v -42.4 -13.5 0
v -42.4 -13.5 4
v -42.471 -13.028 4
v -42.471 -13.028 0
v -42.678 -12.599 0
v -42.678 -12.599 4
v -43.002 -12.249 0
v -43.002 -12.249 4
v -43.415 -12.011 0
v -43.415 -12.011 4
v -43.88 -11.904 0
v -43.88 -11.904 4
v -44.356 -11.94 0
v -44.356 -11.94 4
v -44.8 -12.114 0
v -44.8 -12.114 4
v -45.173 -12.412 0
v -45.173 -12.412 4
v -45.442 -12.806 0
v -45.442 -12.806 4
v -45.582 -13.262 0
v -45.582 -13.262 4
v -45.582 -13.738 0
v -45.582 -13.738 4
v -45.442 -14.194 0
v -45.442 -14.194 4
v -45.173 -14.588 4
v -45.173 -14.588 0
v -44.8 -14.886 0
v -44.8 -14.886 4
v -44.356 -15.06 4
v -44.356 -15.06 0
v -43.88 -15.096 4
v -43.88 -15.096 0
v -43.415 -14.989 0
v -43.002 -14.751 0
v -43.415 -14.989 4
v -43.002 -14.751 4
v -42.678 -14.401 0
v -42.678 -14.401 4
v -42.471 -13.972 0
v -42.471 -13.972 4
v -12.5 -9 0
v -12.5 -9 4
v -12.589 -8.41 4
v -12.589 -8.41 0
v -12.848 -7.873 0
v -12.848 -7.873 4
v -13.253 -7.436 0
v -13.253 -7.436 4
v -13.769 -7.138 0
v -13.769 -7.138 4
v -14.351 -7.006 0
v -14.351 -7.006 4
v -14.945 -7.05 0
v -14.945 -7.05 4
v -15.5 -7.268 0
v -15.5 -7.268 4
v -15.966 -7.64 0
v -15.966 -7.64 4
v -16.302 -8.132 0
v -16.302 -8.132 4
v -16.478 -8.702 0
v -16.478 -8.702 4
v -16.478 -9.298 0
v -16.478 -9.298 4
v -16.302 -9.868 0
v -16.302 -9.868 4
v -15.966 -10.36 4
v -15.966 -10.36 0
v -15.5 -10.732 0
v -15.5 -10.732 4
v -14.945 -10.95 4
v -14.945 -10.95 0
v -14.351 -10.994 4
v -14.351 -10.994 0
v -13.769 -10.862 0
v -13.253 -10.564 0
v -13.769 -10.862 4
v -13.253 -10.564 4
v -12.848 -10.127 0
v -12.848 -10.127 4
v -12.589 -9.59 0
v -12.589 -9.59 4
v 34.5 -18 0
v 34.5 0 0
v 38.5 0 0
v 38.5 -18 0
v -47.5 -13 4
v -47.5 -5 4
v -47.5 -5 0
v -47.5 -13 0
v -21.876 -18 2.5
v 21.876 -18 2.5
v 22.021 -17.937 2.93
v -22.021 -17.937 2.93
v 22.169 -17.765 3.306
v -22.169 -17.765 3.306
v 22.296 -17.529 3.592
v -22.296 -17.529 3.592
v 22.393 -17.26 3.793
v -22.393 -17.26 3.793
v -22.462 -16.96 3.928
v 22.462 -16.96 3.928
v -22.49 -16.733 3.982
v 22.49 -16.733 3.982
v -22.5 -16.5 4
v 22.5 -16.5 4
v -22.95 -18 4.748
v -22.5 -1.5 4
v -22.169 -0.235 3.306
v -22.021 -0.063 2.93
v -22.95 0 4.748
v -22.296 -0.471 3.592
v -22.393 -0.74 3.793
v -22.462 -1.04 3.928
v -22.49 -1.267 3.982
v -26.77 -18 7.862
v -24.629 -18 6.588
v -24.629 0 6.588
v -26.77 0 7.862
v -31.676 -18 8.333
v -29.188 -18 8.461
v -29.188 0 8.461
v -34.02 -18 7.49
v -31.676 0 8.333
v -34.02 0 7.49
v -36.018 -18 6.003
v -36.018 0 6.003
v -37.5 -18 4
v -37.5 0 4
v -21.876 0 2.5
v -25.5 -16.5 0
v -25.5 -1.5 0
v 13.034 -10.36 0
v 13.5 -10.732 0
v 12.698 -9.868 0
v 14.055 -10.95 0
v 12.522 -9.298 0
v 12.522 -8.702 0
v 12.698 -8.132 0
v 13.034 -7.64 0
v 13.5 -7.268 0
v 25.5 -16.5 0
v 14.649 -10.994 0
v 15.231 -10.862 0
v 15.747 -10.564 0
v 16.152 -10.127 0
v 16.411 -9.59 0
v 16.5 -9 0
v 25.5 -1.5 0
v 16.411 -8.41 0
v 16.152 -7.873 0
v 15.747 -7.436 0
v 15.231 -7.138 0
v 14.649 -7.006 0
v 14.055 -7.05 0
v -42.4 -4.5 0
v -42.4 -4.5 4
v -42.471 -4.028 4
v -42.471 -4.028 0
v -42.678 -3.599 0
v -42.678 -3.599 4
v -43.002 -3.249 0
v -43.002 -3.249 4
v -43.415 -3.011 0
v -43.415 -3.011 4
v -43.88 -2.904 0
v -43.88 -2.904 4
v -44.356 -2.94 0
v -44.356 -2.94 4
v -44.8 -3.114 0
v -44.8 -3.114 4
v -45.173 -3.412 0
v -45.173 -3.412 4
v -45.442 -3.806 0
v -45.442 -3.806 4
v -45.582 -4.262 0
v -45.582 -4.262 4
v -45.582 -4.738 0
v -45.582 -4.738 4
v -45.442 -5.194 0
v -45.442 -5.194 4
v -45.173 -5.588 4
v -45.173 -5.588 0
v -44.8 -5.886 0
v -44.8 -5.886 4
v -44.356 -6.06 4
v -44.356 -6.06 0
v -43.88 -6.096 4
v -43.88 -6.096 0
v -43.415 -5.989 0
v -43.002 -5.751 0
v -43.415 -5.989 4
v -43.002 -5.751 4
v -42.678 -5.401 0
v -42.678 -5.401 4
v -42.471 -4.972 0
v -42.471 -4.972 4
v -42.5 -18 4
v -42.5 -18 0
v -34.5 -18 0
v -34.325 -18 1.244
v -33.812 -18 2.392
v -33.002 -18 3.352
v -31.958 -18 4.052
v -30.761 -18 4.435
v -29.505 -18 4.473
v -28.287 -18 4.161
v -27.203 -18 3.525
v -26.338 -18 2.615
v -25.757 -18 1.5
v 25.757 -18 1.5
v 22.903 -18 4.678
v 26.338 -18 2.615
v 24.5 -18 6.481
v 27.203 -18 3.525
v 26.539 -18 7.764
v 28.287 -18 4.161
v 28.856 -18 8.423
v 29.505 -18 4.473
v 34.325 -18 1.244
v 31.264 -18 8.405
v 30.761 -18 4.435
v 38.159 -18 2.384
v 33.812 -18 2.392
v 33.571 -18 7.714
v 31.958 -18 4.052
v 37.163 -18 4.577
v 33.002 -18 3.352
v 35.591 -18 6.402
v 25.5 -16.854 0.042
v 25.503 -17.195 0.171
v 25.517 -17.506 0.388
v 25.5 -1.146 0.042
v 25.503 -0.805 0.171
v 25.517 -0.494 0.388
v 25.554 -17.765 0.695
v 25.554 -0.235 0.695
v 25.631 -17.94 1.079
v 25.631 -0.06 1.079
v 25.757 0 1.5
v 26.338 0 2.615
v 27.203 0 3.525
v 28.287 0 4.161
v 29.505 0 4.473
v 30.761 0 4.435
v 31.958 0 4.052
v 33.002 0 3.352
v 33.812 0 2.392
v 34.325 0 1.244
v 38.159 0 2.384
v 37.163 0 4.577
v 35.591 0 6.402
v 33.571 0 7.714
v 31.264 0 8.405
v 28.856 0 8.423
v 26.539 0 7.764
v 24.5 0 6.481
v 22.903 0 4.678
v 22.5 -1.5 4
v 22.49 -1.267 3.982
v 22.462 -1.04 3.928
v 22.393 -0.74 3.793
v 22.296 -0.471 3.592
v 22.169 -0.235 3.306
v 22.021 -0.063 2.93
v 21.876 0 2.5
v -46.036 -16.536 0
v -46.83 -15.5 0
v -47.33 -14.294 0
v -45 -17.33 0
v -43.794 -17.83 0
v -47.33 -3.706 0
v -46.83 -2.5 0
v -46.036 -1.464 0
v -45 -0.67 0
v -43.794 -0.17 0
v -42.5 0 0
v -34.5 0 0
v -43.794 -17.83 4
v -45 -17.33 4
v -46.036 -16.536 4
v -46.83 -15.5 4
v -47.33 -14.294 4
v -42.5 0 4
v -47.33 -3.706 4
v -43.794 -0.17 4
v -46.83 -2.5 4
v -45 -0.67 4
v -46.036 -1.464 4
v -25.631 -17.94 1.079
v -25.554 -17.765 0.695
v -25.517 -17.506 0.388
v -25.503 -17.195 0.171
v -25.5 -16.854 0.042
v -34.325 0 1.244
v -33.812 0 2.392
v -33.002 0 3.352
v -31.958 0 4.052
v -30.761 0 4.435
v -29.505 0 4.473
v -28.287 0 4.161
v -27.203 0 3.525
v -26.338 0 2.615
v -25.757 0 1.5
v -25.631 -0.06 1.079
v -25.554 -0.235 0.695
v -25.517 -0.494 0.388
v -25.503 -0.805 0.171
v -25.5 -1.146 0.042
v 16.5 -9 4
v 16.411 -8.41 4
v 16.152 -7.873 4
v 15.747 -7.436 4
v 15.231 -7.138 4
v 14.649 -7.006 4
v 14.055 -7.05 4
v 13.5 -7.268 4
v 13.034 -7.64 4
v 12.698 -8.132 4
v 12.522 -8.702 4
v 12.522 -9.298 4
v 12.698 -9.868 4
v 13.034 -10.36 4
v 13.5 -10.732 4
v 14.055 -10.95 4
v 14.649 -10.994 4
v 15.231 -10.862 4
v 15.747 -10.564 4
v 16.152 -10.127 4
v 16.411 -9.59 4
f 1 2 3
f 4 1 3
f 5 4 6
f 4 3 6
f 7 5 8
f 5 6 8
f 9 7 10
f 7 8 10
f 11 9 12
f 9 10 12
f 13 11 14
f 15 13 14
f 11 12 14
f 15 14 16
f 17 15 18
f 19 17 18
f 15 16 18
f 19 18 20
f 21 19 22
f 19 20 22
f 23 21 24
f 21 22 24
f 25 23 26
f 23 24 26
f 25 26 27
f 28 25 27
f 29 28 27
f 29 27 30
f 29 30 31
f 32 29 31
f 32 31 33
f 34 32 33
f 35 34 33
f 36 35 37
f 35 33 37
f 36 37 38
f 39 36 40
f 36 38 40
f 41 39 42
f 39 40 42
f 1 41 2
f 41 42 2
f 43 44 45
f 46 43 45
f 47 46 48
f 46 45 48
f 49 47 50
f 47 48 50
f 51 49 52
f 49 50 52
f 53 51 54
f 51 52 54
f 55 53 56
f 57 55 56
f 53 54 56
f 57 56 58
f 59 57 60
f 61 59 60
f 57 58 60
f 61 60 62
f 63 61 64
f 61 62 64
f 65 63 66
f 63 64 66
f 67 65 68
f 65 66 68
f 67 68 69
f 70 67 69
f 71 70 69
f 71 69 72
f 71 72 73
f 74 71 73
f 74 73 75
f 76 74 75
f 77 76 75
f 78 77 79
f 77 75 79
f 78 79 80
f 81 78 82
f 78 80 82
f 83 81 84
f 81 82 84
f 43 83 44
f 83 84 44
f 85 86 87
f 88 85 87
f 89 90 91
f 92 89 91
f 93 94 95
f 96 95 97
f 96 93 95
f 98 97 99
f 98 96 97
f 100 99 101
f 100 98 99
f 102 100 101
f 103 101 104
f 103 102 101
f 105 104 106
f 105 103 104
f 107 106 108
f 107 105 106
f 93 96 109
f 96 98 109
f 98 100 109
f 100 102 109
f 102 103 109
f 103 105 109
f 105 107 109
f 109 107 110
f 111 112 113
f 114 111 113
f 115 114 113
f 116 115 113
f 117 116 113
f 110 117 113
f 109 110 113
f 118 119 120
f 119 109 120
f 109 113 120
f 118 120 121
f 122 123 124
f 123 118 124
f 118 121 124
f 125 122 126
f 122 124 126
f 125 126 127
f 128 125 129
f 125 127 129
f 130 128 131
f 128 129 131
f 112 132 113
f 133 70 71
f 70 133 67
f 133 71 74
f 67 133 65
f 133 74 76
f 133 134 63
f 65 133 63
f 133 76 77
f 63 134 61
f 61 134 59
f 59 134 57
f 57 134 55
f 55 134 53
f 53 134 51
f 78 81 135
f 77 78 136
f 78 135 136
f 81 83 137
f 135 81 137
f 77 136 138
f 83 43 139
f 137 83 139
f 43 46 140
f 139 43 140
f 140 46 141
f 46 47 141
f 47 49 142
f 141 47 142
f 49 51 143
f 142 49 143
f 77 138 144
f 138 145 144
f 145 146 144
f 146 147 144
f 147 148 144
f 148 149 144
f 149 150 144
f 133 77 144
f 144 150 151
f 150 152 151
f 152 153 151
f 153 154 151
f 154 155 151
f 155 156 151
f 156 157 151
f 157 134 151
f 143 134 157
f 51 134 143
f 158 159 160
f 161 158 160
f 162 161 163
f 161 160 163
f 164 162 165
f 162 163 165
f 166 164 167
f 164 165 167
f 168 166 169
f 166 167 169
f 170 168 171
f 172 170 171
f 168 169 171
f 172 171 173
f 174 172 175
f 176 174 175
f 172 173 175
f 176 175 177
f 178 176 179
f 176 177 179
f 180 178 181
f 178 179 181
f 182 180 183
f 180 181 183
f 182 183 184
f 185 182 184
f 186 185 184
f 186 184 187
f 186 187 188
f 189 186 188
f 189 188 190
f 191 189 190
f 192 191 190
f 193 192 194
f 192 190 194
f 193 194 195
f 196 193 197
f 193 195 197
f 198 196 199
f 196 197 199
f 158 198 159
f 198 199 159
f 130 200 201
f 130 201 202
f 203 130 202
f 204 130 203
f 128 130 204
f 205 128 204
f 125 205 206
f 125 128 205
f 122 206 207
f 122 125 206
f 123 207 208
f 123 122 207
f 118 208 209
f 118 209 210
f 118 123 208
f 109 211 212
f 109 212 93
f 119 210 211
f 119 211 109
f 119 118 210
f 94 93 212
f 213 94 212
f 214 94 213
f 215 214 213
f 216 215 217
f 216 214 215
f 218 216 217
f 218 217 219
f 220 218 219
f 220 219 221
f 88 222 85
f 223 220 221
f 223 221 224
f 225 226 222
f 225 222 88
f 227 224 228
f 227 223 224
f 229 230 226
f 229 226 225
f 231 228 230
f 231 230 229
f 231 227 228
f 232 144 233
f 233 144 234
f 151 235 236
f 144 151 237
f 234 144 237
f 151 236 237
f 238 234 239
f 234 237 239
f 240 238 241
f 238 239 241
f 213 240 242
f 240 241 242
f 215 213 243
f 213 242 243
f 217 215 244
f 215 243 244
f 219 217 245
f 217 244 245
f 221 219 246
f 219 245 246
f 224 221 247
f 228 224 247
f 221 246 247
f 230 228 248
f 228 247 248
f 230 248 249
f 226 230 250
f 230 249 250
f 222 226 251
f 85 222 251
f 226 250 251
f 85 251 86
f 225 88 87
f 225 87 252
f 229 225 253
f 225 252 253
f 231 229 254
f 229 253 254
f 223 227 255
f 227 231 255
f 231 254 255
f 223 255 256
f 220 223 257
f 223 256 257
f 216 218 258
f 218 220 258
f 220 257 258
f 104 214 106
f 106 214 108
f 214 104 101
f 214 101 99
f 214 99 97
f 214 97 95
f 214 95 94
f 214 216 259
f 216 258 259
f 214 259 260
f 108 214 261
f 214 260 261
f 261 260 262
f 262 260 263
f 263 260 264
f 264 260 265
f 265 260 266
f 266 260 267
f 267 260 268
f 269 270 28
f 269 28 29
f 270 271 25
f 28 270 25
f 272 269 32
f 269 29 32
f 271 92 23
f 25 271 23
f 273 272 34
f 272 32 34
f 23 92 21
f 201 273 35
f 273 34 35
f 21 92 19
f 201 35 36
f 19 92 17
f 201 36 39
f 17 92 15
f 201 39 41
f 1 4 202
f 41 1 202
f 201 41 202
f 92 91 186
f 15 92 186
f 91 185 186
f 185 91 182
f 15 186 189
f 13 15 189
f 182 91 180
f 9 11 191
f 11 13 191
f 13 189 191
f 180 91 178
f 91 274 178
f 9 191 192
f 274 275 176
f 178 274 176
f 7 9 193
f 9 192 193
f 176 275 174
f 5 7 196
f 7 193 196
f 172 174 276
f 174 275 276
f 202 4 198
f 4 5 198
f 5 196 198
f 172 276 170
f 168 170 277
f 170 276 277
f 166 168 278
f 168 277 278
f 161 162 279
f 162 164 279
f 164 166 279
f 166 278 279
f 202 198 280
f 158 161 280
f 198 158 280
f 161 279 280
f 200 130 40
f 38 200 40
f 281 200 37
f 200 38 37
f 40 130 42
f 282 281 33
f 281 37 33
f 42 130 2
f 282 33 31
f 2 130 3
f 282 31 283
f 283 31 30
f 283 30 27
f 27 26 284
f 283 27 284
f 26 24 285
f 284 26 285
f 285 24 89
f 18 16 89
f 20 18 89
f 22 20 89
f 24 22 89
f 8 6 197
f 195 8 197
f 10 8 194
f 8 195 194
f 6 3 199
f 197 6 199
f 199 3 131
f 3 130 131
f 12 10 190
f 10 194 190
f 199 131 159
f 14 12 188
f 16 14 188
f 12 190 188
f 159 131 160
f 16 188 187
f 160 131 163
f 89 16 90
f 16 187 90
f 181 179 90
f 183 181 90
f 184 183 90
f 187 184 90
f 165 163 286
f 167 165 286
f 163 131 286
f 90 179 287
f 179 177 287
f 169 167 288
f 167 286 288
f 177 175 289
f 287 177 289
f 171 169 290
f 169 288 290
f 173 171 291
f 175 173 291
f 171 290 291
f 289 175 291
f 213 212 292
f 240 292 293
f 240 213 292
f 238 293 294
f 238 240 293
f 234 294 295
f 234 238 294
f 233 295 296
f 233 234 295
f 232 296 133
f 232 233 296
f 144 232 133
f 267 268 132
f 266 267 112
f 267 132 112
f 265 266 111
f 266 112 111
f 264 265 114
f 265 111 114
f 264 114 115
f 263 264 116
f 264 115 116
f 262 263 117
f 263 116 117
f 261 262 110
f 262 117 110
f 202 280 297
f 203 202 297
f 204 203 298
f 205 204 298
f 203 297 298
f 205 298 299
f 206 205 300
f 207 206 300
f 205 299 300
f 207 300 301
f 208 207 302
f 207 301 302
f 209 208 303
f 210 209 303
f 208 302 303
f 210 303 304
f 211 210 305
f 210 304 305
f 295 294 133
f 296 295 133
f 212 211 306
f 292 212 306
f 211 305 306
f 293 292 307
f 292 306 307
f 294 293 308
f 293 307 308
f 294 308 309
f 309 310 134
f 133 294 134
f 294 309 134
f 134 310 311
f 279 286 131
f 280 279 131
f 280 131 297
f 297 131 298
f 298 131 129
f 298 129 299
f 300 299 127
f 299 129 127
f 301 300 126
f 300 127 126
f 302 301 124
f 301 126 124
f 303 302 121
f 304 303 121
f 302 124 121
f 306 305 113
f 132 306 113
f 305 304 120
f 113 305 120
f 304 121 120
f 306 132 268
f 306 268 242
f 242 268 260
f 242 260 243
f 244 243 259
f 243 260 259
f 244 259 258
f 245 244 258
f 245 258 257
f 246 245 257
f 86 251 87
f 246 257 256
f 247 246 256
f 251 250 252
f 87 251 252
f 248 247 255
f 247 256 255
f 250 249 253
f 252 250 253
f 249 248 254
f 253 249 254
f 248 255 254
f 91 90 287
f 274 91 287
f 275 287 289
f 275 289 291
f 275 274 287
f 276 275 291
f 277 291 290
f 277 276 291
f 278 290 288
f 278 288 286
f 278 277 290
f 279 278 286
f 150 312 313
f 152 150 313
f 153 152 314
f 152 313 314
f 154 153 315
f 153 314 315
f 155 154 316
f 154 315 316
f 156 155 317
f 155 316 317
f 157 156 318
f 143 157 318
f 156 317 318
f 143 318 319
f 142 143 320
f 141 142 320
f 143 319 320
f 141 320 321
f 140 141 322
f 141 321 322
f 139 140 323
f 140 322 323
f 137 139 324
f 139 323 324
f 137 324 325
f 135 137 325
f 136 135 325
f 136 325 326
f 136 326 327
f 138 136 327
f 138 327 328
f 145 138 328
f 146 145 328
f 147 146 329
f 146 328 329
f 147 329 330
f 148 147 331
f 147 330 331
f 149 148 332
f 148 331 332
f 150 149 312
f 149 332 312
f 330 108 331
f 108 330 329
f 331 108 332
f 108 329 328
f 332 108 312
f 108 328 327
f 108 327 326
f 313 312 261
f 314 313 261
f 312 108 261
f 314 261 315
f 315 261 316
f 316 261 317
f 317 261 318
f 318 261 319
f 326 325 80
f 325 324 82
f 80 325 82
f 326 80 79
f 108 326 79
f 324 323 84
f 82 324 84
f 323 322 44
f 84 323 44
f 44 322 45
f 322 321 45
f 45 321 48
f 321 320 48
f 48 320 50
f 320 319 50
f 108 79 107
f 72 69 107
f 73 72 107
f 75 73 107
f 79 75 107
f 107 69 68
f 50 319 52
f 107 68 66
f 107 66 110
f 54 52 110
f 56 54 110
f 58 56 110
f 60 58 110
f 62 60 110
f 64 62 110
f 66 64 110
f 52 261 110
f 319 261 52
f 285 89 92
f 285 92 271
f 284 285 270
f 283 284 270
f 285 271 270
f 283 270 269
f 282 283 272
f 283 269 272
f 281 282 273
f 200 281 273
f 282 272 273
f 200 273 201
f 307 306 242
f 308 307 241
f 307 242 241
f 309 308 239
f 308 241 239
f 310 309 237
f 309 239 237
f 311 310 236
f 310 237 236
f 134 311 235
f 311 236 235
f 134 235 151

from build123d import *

# Parameters (mm, degrees)
F1_DEPTH = 18
F2_R     = 5
F3_R     = 1.5
F4_R     = 1.6
F5_DEPTH = 4
F4_R_2   = 2
F6_DEPTH = 4


with BuildPart() as f1:
    # F0 (on Front) → F1 (new body)
    with BuildSketch(Plane.XZ):
        with BuildLine():
            ThreePointArc((25.5, 0), (30, 4.5), (34.5, 0))
            Line((34.5, 0), (38.5, 0))
            ThreePointArc((38.5, 0), (32.061553, 8.246211), (22.5, 4))
            Line((22.5, 4), (-22.5, 4))
            ThreePointArc((-22.5, 4), (-30, 8.5), (-37.5, 4))
            Line((-37.5, 4), (-44.5, 4))
            Line((-44.5, 4), (-47.5, 4))
            Line((-47.5, 4), (-47.5, 0))
            Line((-47.5, 0), (-38.5, 0))
            Line((-38.5, 0), (-34.5, 0))
            ThreePointArc((-34.5, 0), (-30, 4.5), (-25.5, 0))
            Line((-25.5, 0), (25.5, 0))
        make_face()
    extrude(amount=F1_DEPTH)

    # F2
    f2_edges = [f1.edges().sort_by_distance(p)[0] for p in [
        (-47.5, -18, 2),
        (-47.5, 0, 2),
    ]]
    fillet(f2_edges, radius=F2_R)

    # F3
    f3_edges = [f1.edges().sort_by_distance(p)[0] for p in [
        (0, -18, 4),
        (0, -18, 0),
        (0, 0, 4),
        (0, 0, 0),
    ]]
    fillet(f3_edges, radius=F3_R)

    # F4 (on face) → F5 (cut, through all)
    with BuildSketch(Plane.XY.offset(4)):
        with Locations((-44, -4.5)):
            Circle(F4_R)
        with Locations((-44, -13.5)):
            Circle(F4_R)
    extrude(amount=-F5_DEPTH, mode=Mode.SUBTRACT)

    # F4 (on face) → F6 (cut, through all)
    with BuildSketch(Plane.XY.offset(4)):
        with Locations((14.5, -9)):
            Circle(F4_R_2)
        with Locations((-14.5, -9)):
            Circle(F4_R_2)
    extrude(amount=-F6_DEPTH, mode=Mode.SUBTRACT)


solid = f1.part
